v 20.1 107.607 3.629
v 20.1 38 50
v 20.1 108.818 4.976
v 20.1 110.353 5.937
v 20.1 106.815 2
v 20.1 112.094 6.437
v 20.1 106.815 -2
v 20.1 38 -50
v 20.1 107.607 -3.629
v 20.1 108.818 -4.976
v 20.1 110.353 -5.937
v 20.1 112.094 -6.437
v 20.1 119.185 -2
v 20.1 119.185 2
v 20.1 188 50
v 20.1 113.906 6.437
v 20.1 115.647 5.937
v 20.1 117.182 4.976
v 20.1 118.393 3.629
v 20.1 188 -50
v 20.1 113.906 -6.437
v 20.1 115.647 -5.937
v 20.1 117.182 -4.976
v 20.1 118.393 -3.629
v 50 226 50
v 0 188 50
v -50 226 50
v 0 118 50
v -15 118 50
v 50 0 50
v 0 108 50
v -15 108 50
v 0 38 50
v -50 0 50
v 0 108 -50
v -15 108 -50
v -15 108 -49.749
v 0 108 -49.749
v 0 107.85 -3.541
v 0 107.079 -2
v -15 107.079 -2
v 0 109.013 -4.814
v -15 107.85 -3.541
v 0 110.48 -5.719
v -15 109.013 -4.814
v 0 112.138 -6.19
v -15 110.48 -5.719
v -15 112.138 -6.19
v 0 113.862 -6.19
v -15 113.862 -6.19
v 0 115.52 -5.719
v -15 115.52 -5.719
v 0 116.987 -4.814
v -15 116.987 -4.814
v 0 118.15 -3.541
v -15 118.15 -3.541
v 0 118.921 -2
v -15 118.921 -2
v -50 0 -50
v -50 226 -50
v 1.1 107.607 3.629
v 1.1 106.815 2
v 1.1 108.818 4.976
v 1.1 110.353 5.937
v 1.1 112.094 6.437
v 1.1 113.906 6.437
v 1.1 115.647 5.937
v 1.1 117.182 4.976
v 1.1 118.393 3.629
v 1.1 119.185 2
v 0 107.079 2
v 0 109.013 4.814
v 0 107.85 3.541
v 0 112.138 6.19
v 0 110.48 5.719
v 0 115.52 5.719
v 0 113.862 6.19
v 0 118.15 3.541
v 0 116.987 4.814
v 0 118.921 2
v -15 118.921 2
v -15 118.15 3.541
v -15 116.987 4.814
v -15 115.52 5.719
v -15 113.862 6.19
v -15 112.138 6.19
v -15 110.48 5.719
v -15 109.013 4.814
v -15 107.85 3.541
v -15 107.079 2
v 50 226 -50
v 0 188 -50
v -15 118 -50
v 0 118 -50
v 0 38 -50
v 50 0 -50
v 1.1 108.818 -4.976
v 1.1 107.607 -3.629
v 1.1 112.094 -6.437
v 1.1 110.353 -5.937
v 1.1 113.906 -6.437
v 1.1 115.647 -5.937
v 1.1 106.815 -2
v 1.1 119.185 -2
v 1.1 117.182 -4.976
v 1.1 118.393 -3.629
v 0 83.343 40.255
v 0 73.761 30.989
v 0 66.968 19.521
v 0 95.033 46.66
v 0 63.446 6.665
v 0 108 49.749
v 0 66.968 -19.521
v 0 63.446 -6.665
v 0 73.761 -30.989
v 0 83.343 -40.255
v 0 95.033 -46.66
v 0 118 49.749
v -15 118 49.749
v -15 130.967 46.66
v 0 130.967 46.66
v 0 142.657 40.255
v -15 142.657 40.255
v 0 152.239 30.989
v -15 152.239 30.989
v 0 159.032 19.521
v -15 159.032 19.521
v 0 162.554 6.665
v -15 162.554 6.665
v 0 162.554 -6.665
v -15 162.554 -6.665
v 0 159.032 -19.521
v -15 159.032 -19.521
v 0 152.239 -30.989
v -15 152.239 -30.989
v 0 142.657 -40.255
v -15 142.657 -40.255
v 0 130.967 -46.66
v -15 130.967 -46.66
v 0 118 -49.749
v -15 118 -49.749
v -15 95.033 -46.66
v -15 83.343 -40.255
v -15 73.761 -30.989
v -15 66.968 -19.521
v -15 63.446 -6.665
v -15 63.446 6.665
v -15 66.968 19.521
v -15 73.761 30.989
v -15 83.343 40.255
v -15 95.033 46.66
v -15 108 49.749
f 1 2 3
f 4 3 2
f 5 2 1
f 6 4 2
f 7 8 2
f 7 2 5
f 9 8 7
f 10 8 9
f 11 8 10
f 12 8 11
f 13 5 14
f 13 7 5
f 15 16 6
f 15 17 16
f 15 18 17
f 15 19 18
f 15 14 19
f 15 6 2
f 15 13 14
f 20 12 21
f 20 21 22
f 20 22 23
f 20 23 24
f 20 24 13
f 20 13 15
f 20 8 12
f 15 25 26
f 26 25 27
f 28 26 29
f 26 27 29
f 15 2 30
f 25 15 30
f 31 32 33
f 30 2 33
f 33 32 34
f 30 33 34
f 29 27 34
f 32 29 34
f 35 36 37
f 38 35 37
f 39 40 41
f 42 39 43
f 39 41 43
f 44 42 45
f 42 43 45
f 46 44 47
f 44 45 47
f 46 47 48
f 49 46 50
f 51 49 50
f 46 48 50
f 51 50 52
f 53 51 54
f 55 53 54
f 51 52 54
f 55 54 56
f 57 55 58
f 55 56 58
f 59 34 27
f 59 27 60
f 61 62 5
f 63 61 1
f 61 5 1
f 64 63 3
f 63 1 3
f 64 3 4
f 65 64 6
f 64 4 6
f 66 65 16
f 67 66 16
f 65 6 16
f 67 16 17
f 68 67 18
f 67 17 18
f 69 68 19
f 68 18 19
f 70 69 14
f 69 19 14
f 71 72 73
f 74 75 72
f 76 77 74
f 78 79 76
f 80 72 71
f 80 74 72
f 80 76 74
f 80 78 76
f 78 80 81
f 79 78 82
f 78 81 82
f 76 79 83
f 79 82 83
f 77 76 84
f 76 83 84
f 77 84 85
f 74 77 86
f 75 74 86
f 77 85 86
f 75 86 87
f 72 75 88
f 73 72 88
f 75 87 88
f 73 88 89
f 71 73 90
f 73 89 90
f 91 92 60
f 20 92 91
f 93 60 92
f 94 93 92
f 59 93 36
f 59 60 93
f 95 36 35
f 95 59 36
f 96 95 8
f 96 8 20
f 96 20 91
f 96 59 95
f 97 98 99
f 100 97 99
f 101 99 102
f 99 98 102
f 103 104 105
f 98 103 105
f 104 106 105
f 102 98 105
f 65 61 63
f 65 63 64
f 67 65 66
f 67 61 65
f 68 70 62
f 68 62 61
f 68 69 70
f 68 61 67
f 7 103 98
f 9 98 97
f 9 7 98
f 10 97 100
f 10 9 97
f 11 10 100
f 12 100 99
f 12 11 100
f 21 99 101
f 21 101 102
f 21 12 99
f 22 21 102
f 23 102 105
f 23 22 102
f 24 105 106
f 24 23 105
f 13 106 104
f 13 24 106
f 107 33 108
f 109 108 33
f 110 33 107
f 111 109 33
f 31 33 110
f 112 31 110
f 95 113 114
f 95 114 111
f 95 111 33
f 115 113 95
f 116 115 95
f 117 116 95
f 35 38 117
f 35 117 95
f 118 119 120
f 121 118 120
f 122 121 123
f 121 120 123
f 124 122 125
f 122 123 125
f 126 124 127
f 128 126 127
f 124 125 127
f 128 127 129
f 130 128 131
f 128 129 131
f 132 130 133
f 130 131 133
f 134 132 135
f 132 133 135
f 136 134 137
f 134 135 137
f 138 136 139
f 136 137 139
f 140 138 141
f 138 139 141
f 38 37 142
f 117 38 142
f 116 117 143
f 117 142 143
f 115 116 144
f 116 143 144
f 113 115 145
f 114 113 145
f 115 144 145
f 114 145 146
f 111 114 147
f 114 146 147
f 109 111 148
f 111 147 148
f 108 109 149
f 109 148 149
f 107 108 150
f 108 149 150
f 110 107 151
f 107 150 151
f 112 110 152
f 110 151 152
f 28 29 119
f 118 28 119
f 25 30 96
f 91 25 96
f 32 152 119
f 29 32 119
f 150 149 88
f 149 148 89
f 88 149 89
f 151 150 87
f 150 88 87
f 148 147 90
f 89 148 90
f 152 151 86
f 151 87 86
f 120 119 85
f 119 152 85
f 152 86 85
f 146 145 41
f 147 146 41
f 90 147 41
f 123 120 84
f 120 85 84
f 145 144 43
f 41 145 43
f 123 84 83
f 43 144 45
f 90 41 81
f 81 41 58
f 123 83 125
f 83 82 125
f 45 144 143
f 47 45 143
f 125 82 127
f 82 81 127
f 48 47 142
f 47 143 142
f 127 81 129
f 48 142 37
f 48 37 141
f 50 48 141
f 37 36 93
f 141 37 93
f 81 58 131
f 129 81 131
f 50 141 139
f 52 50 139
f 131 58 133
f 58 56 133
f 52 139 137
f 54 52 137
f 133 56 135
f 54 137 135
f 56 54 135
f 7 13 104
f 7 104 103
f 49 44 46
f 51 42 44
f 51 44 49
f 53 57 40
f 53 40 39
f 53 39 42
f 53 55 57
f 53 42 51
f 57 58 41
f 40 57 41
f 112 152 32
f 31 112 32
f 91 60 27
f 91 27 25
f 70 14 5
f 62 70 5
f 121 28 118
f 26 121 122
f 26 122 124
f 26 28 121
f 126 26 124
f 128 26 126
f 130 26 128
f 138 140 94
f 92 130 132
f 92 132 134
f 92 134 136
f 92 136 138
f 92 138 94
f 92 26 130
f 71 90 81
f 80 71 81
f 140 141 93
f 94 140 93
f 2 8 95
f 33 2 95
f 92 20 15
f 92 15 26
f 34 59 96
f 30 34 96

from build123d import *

# Parameters (mm, degrees)
SKETCH1_W           = 100
SKETCH1_H           = 100
BOSS_EXTRUDE1_DEPTH = 226
SKETCH5_W           = 35.1
SKETCH5_H           = 150
CUT_EXTRUDE1_DEPTH  = 101
BOSS_EXTRUDE2_DEPTH = 15
BOSS_EXTRUDE4_DEPTH = 19


with BuildPart() as part:
    # Sketch1 → Boss-Extrude1 (new body)
    with BuildSketch(Plane(origin=(0, 0, 0), x_dir=(1, 0, 0), z_dir=(0, 1, 0))):
        Rectangle(SKETCH1_W, SKETCH1_H)
    extrude(amount=BOSS_EXTRUDE1_DEPTH)

    # Sketch5 → Cut-Extrude1 (cut, through all)
    with BuildSketch(Plane(origin=(0, 0, -50), x_dir=(-1, 0, 0), z_dir=(0, 0, -1))):
        with Locations((-2.55, 113)):
            Rectangle(SKETCH5_W, SKETCH5_H)
    extrude(amount=-CUT_EXTRUDE1_DEPTH, mode=Mode.SUBTRACT)

    # Sketch6 → Boss-Extrude2 (add)
    with BuildSketch(Plane(origin=(-15, 0, 0), x_dir=(0, 0, -1), z_dir=(1, 0, 0))):
        with BuildLine():
            ThreePointArc((-2, 118.921359641), (-6.25, 113), (-2, 107.078640359))
            Line((-2, 107.078640359), (-2, 118.921359641))
        make_face()
        with BuildLine():
            Line((2, 118.921359641), (2, 107.078640359))
            ThreePointArc((2, 107.078640359), (6.25, 113), (2, 118.921359641))
        make_face()
        with BuildLine():
            Line((-50, 118), (-49.749371855, 118))
            ThreePointArc((-49.749371855, 118), (0, 163), (49.749371855, 118))
            Line((49.749371855, 118), (50, 118))
            Line((50, 118), (50, 188))
            Line((50, 188), (-50, 188))
            Line((-50, 188), (-50, 118))
        make_face()
        with BuildLine():
            ThreePointArc((49.749371855, 108), (0, 63), (-49.749371855, 108))
            Line((-49.749371855, 108), (-50, 108))
            Line((-50, 108), (-50, 38))
            Line((-50, 38), (50, 38))
            Line((50, 38), (50, 108))
            Line((50, 108), (49.749371855, 108))
        make_face()
    extrude(amount=BOSS_EXTRUDE2_DEPTH)

    # Sketch10 → Boss-Extrude4 (add)
    with BuildSketch(Plane.ZY.offset(-20.1)):
        with BuildLine():
            Line((-2, 119.184658438), (-2, 106.815341562))
            ThreePointArc((-2, 106.815341562), (-6.5, 113), (-2, 119.184658438))
        make_face()
        with BuildLine():
            Line((2, 119.184658438), (2, 106.815341562))
            ThreePointArc((2, 106.815341562), (6.5, 113), (2, 119.184658438))
        make_face()
    extrude(amount=BOSS_EXTRUDE4_DEPTH)


solid = part.part
